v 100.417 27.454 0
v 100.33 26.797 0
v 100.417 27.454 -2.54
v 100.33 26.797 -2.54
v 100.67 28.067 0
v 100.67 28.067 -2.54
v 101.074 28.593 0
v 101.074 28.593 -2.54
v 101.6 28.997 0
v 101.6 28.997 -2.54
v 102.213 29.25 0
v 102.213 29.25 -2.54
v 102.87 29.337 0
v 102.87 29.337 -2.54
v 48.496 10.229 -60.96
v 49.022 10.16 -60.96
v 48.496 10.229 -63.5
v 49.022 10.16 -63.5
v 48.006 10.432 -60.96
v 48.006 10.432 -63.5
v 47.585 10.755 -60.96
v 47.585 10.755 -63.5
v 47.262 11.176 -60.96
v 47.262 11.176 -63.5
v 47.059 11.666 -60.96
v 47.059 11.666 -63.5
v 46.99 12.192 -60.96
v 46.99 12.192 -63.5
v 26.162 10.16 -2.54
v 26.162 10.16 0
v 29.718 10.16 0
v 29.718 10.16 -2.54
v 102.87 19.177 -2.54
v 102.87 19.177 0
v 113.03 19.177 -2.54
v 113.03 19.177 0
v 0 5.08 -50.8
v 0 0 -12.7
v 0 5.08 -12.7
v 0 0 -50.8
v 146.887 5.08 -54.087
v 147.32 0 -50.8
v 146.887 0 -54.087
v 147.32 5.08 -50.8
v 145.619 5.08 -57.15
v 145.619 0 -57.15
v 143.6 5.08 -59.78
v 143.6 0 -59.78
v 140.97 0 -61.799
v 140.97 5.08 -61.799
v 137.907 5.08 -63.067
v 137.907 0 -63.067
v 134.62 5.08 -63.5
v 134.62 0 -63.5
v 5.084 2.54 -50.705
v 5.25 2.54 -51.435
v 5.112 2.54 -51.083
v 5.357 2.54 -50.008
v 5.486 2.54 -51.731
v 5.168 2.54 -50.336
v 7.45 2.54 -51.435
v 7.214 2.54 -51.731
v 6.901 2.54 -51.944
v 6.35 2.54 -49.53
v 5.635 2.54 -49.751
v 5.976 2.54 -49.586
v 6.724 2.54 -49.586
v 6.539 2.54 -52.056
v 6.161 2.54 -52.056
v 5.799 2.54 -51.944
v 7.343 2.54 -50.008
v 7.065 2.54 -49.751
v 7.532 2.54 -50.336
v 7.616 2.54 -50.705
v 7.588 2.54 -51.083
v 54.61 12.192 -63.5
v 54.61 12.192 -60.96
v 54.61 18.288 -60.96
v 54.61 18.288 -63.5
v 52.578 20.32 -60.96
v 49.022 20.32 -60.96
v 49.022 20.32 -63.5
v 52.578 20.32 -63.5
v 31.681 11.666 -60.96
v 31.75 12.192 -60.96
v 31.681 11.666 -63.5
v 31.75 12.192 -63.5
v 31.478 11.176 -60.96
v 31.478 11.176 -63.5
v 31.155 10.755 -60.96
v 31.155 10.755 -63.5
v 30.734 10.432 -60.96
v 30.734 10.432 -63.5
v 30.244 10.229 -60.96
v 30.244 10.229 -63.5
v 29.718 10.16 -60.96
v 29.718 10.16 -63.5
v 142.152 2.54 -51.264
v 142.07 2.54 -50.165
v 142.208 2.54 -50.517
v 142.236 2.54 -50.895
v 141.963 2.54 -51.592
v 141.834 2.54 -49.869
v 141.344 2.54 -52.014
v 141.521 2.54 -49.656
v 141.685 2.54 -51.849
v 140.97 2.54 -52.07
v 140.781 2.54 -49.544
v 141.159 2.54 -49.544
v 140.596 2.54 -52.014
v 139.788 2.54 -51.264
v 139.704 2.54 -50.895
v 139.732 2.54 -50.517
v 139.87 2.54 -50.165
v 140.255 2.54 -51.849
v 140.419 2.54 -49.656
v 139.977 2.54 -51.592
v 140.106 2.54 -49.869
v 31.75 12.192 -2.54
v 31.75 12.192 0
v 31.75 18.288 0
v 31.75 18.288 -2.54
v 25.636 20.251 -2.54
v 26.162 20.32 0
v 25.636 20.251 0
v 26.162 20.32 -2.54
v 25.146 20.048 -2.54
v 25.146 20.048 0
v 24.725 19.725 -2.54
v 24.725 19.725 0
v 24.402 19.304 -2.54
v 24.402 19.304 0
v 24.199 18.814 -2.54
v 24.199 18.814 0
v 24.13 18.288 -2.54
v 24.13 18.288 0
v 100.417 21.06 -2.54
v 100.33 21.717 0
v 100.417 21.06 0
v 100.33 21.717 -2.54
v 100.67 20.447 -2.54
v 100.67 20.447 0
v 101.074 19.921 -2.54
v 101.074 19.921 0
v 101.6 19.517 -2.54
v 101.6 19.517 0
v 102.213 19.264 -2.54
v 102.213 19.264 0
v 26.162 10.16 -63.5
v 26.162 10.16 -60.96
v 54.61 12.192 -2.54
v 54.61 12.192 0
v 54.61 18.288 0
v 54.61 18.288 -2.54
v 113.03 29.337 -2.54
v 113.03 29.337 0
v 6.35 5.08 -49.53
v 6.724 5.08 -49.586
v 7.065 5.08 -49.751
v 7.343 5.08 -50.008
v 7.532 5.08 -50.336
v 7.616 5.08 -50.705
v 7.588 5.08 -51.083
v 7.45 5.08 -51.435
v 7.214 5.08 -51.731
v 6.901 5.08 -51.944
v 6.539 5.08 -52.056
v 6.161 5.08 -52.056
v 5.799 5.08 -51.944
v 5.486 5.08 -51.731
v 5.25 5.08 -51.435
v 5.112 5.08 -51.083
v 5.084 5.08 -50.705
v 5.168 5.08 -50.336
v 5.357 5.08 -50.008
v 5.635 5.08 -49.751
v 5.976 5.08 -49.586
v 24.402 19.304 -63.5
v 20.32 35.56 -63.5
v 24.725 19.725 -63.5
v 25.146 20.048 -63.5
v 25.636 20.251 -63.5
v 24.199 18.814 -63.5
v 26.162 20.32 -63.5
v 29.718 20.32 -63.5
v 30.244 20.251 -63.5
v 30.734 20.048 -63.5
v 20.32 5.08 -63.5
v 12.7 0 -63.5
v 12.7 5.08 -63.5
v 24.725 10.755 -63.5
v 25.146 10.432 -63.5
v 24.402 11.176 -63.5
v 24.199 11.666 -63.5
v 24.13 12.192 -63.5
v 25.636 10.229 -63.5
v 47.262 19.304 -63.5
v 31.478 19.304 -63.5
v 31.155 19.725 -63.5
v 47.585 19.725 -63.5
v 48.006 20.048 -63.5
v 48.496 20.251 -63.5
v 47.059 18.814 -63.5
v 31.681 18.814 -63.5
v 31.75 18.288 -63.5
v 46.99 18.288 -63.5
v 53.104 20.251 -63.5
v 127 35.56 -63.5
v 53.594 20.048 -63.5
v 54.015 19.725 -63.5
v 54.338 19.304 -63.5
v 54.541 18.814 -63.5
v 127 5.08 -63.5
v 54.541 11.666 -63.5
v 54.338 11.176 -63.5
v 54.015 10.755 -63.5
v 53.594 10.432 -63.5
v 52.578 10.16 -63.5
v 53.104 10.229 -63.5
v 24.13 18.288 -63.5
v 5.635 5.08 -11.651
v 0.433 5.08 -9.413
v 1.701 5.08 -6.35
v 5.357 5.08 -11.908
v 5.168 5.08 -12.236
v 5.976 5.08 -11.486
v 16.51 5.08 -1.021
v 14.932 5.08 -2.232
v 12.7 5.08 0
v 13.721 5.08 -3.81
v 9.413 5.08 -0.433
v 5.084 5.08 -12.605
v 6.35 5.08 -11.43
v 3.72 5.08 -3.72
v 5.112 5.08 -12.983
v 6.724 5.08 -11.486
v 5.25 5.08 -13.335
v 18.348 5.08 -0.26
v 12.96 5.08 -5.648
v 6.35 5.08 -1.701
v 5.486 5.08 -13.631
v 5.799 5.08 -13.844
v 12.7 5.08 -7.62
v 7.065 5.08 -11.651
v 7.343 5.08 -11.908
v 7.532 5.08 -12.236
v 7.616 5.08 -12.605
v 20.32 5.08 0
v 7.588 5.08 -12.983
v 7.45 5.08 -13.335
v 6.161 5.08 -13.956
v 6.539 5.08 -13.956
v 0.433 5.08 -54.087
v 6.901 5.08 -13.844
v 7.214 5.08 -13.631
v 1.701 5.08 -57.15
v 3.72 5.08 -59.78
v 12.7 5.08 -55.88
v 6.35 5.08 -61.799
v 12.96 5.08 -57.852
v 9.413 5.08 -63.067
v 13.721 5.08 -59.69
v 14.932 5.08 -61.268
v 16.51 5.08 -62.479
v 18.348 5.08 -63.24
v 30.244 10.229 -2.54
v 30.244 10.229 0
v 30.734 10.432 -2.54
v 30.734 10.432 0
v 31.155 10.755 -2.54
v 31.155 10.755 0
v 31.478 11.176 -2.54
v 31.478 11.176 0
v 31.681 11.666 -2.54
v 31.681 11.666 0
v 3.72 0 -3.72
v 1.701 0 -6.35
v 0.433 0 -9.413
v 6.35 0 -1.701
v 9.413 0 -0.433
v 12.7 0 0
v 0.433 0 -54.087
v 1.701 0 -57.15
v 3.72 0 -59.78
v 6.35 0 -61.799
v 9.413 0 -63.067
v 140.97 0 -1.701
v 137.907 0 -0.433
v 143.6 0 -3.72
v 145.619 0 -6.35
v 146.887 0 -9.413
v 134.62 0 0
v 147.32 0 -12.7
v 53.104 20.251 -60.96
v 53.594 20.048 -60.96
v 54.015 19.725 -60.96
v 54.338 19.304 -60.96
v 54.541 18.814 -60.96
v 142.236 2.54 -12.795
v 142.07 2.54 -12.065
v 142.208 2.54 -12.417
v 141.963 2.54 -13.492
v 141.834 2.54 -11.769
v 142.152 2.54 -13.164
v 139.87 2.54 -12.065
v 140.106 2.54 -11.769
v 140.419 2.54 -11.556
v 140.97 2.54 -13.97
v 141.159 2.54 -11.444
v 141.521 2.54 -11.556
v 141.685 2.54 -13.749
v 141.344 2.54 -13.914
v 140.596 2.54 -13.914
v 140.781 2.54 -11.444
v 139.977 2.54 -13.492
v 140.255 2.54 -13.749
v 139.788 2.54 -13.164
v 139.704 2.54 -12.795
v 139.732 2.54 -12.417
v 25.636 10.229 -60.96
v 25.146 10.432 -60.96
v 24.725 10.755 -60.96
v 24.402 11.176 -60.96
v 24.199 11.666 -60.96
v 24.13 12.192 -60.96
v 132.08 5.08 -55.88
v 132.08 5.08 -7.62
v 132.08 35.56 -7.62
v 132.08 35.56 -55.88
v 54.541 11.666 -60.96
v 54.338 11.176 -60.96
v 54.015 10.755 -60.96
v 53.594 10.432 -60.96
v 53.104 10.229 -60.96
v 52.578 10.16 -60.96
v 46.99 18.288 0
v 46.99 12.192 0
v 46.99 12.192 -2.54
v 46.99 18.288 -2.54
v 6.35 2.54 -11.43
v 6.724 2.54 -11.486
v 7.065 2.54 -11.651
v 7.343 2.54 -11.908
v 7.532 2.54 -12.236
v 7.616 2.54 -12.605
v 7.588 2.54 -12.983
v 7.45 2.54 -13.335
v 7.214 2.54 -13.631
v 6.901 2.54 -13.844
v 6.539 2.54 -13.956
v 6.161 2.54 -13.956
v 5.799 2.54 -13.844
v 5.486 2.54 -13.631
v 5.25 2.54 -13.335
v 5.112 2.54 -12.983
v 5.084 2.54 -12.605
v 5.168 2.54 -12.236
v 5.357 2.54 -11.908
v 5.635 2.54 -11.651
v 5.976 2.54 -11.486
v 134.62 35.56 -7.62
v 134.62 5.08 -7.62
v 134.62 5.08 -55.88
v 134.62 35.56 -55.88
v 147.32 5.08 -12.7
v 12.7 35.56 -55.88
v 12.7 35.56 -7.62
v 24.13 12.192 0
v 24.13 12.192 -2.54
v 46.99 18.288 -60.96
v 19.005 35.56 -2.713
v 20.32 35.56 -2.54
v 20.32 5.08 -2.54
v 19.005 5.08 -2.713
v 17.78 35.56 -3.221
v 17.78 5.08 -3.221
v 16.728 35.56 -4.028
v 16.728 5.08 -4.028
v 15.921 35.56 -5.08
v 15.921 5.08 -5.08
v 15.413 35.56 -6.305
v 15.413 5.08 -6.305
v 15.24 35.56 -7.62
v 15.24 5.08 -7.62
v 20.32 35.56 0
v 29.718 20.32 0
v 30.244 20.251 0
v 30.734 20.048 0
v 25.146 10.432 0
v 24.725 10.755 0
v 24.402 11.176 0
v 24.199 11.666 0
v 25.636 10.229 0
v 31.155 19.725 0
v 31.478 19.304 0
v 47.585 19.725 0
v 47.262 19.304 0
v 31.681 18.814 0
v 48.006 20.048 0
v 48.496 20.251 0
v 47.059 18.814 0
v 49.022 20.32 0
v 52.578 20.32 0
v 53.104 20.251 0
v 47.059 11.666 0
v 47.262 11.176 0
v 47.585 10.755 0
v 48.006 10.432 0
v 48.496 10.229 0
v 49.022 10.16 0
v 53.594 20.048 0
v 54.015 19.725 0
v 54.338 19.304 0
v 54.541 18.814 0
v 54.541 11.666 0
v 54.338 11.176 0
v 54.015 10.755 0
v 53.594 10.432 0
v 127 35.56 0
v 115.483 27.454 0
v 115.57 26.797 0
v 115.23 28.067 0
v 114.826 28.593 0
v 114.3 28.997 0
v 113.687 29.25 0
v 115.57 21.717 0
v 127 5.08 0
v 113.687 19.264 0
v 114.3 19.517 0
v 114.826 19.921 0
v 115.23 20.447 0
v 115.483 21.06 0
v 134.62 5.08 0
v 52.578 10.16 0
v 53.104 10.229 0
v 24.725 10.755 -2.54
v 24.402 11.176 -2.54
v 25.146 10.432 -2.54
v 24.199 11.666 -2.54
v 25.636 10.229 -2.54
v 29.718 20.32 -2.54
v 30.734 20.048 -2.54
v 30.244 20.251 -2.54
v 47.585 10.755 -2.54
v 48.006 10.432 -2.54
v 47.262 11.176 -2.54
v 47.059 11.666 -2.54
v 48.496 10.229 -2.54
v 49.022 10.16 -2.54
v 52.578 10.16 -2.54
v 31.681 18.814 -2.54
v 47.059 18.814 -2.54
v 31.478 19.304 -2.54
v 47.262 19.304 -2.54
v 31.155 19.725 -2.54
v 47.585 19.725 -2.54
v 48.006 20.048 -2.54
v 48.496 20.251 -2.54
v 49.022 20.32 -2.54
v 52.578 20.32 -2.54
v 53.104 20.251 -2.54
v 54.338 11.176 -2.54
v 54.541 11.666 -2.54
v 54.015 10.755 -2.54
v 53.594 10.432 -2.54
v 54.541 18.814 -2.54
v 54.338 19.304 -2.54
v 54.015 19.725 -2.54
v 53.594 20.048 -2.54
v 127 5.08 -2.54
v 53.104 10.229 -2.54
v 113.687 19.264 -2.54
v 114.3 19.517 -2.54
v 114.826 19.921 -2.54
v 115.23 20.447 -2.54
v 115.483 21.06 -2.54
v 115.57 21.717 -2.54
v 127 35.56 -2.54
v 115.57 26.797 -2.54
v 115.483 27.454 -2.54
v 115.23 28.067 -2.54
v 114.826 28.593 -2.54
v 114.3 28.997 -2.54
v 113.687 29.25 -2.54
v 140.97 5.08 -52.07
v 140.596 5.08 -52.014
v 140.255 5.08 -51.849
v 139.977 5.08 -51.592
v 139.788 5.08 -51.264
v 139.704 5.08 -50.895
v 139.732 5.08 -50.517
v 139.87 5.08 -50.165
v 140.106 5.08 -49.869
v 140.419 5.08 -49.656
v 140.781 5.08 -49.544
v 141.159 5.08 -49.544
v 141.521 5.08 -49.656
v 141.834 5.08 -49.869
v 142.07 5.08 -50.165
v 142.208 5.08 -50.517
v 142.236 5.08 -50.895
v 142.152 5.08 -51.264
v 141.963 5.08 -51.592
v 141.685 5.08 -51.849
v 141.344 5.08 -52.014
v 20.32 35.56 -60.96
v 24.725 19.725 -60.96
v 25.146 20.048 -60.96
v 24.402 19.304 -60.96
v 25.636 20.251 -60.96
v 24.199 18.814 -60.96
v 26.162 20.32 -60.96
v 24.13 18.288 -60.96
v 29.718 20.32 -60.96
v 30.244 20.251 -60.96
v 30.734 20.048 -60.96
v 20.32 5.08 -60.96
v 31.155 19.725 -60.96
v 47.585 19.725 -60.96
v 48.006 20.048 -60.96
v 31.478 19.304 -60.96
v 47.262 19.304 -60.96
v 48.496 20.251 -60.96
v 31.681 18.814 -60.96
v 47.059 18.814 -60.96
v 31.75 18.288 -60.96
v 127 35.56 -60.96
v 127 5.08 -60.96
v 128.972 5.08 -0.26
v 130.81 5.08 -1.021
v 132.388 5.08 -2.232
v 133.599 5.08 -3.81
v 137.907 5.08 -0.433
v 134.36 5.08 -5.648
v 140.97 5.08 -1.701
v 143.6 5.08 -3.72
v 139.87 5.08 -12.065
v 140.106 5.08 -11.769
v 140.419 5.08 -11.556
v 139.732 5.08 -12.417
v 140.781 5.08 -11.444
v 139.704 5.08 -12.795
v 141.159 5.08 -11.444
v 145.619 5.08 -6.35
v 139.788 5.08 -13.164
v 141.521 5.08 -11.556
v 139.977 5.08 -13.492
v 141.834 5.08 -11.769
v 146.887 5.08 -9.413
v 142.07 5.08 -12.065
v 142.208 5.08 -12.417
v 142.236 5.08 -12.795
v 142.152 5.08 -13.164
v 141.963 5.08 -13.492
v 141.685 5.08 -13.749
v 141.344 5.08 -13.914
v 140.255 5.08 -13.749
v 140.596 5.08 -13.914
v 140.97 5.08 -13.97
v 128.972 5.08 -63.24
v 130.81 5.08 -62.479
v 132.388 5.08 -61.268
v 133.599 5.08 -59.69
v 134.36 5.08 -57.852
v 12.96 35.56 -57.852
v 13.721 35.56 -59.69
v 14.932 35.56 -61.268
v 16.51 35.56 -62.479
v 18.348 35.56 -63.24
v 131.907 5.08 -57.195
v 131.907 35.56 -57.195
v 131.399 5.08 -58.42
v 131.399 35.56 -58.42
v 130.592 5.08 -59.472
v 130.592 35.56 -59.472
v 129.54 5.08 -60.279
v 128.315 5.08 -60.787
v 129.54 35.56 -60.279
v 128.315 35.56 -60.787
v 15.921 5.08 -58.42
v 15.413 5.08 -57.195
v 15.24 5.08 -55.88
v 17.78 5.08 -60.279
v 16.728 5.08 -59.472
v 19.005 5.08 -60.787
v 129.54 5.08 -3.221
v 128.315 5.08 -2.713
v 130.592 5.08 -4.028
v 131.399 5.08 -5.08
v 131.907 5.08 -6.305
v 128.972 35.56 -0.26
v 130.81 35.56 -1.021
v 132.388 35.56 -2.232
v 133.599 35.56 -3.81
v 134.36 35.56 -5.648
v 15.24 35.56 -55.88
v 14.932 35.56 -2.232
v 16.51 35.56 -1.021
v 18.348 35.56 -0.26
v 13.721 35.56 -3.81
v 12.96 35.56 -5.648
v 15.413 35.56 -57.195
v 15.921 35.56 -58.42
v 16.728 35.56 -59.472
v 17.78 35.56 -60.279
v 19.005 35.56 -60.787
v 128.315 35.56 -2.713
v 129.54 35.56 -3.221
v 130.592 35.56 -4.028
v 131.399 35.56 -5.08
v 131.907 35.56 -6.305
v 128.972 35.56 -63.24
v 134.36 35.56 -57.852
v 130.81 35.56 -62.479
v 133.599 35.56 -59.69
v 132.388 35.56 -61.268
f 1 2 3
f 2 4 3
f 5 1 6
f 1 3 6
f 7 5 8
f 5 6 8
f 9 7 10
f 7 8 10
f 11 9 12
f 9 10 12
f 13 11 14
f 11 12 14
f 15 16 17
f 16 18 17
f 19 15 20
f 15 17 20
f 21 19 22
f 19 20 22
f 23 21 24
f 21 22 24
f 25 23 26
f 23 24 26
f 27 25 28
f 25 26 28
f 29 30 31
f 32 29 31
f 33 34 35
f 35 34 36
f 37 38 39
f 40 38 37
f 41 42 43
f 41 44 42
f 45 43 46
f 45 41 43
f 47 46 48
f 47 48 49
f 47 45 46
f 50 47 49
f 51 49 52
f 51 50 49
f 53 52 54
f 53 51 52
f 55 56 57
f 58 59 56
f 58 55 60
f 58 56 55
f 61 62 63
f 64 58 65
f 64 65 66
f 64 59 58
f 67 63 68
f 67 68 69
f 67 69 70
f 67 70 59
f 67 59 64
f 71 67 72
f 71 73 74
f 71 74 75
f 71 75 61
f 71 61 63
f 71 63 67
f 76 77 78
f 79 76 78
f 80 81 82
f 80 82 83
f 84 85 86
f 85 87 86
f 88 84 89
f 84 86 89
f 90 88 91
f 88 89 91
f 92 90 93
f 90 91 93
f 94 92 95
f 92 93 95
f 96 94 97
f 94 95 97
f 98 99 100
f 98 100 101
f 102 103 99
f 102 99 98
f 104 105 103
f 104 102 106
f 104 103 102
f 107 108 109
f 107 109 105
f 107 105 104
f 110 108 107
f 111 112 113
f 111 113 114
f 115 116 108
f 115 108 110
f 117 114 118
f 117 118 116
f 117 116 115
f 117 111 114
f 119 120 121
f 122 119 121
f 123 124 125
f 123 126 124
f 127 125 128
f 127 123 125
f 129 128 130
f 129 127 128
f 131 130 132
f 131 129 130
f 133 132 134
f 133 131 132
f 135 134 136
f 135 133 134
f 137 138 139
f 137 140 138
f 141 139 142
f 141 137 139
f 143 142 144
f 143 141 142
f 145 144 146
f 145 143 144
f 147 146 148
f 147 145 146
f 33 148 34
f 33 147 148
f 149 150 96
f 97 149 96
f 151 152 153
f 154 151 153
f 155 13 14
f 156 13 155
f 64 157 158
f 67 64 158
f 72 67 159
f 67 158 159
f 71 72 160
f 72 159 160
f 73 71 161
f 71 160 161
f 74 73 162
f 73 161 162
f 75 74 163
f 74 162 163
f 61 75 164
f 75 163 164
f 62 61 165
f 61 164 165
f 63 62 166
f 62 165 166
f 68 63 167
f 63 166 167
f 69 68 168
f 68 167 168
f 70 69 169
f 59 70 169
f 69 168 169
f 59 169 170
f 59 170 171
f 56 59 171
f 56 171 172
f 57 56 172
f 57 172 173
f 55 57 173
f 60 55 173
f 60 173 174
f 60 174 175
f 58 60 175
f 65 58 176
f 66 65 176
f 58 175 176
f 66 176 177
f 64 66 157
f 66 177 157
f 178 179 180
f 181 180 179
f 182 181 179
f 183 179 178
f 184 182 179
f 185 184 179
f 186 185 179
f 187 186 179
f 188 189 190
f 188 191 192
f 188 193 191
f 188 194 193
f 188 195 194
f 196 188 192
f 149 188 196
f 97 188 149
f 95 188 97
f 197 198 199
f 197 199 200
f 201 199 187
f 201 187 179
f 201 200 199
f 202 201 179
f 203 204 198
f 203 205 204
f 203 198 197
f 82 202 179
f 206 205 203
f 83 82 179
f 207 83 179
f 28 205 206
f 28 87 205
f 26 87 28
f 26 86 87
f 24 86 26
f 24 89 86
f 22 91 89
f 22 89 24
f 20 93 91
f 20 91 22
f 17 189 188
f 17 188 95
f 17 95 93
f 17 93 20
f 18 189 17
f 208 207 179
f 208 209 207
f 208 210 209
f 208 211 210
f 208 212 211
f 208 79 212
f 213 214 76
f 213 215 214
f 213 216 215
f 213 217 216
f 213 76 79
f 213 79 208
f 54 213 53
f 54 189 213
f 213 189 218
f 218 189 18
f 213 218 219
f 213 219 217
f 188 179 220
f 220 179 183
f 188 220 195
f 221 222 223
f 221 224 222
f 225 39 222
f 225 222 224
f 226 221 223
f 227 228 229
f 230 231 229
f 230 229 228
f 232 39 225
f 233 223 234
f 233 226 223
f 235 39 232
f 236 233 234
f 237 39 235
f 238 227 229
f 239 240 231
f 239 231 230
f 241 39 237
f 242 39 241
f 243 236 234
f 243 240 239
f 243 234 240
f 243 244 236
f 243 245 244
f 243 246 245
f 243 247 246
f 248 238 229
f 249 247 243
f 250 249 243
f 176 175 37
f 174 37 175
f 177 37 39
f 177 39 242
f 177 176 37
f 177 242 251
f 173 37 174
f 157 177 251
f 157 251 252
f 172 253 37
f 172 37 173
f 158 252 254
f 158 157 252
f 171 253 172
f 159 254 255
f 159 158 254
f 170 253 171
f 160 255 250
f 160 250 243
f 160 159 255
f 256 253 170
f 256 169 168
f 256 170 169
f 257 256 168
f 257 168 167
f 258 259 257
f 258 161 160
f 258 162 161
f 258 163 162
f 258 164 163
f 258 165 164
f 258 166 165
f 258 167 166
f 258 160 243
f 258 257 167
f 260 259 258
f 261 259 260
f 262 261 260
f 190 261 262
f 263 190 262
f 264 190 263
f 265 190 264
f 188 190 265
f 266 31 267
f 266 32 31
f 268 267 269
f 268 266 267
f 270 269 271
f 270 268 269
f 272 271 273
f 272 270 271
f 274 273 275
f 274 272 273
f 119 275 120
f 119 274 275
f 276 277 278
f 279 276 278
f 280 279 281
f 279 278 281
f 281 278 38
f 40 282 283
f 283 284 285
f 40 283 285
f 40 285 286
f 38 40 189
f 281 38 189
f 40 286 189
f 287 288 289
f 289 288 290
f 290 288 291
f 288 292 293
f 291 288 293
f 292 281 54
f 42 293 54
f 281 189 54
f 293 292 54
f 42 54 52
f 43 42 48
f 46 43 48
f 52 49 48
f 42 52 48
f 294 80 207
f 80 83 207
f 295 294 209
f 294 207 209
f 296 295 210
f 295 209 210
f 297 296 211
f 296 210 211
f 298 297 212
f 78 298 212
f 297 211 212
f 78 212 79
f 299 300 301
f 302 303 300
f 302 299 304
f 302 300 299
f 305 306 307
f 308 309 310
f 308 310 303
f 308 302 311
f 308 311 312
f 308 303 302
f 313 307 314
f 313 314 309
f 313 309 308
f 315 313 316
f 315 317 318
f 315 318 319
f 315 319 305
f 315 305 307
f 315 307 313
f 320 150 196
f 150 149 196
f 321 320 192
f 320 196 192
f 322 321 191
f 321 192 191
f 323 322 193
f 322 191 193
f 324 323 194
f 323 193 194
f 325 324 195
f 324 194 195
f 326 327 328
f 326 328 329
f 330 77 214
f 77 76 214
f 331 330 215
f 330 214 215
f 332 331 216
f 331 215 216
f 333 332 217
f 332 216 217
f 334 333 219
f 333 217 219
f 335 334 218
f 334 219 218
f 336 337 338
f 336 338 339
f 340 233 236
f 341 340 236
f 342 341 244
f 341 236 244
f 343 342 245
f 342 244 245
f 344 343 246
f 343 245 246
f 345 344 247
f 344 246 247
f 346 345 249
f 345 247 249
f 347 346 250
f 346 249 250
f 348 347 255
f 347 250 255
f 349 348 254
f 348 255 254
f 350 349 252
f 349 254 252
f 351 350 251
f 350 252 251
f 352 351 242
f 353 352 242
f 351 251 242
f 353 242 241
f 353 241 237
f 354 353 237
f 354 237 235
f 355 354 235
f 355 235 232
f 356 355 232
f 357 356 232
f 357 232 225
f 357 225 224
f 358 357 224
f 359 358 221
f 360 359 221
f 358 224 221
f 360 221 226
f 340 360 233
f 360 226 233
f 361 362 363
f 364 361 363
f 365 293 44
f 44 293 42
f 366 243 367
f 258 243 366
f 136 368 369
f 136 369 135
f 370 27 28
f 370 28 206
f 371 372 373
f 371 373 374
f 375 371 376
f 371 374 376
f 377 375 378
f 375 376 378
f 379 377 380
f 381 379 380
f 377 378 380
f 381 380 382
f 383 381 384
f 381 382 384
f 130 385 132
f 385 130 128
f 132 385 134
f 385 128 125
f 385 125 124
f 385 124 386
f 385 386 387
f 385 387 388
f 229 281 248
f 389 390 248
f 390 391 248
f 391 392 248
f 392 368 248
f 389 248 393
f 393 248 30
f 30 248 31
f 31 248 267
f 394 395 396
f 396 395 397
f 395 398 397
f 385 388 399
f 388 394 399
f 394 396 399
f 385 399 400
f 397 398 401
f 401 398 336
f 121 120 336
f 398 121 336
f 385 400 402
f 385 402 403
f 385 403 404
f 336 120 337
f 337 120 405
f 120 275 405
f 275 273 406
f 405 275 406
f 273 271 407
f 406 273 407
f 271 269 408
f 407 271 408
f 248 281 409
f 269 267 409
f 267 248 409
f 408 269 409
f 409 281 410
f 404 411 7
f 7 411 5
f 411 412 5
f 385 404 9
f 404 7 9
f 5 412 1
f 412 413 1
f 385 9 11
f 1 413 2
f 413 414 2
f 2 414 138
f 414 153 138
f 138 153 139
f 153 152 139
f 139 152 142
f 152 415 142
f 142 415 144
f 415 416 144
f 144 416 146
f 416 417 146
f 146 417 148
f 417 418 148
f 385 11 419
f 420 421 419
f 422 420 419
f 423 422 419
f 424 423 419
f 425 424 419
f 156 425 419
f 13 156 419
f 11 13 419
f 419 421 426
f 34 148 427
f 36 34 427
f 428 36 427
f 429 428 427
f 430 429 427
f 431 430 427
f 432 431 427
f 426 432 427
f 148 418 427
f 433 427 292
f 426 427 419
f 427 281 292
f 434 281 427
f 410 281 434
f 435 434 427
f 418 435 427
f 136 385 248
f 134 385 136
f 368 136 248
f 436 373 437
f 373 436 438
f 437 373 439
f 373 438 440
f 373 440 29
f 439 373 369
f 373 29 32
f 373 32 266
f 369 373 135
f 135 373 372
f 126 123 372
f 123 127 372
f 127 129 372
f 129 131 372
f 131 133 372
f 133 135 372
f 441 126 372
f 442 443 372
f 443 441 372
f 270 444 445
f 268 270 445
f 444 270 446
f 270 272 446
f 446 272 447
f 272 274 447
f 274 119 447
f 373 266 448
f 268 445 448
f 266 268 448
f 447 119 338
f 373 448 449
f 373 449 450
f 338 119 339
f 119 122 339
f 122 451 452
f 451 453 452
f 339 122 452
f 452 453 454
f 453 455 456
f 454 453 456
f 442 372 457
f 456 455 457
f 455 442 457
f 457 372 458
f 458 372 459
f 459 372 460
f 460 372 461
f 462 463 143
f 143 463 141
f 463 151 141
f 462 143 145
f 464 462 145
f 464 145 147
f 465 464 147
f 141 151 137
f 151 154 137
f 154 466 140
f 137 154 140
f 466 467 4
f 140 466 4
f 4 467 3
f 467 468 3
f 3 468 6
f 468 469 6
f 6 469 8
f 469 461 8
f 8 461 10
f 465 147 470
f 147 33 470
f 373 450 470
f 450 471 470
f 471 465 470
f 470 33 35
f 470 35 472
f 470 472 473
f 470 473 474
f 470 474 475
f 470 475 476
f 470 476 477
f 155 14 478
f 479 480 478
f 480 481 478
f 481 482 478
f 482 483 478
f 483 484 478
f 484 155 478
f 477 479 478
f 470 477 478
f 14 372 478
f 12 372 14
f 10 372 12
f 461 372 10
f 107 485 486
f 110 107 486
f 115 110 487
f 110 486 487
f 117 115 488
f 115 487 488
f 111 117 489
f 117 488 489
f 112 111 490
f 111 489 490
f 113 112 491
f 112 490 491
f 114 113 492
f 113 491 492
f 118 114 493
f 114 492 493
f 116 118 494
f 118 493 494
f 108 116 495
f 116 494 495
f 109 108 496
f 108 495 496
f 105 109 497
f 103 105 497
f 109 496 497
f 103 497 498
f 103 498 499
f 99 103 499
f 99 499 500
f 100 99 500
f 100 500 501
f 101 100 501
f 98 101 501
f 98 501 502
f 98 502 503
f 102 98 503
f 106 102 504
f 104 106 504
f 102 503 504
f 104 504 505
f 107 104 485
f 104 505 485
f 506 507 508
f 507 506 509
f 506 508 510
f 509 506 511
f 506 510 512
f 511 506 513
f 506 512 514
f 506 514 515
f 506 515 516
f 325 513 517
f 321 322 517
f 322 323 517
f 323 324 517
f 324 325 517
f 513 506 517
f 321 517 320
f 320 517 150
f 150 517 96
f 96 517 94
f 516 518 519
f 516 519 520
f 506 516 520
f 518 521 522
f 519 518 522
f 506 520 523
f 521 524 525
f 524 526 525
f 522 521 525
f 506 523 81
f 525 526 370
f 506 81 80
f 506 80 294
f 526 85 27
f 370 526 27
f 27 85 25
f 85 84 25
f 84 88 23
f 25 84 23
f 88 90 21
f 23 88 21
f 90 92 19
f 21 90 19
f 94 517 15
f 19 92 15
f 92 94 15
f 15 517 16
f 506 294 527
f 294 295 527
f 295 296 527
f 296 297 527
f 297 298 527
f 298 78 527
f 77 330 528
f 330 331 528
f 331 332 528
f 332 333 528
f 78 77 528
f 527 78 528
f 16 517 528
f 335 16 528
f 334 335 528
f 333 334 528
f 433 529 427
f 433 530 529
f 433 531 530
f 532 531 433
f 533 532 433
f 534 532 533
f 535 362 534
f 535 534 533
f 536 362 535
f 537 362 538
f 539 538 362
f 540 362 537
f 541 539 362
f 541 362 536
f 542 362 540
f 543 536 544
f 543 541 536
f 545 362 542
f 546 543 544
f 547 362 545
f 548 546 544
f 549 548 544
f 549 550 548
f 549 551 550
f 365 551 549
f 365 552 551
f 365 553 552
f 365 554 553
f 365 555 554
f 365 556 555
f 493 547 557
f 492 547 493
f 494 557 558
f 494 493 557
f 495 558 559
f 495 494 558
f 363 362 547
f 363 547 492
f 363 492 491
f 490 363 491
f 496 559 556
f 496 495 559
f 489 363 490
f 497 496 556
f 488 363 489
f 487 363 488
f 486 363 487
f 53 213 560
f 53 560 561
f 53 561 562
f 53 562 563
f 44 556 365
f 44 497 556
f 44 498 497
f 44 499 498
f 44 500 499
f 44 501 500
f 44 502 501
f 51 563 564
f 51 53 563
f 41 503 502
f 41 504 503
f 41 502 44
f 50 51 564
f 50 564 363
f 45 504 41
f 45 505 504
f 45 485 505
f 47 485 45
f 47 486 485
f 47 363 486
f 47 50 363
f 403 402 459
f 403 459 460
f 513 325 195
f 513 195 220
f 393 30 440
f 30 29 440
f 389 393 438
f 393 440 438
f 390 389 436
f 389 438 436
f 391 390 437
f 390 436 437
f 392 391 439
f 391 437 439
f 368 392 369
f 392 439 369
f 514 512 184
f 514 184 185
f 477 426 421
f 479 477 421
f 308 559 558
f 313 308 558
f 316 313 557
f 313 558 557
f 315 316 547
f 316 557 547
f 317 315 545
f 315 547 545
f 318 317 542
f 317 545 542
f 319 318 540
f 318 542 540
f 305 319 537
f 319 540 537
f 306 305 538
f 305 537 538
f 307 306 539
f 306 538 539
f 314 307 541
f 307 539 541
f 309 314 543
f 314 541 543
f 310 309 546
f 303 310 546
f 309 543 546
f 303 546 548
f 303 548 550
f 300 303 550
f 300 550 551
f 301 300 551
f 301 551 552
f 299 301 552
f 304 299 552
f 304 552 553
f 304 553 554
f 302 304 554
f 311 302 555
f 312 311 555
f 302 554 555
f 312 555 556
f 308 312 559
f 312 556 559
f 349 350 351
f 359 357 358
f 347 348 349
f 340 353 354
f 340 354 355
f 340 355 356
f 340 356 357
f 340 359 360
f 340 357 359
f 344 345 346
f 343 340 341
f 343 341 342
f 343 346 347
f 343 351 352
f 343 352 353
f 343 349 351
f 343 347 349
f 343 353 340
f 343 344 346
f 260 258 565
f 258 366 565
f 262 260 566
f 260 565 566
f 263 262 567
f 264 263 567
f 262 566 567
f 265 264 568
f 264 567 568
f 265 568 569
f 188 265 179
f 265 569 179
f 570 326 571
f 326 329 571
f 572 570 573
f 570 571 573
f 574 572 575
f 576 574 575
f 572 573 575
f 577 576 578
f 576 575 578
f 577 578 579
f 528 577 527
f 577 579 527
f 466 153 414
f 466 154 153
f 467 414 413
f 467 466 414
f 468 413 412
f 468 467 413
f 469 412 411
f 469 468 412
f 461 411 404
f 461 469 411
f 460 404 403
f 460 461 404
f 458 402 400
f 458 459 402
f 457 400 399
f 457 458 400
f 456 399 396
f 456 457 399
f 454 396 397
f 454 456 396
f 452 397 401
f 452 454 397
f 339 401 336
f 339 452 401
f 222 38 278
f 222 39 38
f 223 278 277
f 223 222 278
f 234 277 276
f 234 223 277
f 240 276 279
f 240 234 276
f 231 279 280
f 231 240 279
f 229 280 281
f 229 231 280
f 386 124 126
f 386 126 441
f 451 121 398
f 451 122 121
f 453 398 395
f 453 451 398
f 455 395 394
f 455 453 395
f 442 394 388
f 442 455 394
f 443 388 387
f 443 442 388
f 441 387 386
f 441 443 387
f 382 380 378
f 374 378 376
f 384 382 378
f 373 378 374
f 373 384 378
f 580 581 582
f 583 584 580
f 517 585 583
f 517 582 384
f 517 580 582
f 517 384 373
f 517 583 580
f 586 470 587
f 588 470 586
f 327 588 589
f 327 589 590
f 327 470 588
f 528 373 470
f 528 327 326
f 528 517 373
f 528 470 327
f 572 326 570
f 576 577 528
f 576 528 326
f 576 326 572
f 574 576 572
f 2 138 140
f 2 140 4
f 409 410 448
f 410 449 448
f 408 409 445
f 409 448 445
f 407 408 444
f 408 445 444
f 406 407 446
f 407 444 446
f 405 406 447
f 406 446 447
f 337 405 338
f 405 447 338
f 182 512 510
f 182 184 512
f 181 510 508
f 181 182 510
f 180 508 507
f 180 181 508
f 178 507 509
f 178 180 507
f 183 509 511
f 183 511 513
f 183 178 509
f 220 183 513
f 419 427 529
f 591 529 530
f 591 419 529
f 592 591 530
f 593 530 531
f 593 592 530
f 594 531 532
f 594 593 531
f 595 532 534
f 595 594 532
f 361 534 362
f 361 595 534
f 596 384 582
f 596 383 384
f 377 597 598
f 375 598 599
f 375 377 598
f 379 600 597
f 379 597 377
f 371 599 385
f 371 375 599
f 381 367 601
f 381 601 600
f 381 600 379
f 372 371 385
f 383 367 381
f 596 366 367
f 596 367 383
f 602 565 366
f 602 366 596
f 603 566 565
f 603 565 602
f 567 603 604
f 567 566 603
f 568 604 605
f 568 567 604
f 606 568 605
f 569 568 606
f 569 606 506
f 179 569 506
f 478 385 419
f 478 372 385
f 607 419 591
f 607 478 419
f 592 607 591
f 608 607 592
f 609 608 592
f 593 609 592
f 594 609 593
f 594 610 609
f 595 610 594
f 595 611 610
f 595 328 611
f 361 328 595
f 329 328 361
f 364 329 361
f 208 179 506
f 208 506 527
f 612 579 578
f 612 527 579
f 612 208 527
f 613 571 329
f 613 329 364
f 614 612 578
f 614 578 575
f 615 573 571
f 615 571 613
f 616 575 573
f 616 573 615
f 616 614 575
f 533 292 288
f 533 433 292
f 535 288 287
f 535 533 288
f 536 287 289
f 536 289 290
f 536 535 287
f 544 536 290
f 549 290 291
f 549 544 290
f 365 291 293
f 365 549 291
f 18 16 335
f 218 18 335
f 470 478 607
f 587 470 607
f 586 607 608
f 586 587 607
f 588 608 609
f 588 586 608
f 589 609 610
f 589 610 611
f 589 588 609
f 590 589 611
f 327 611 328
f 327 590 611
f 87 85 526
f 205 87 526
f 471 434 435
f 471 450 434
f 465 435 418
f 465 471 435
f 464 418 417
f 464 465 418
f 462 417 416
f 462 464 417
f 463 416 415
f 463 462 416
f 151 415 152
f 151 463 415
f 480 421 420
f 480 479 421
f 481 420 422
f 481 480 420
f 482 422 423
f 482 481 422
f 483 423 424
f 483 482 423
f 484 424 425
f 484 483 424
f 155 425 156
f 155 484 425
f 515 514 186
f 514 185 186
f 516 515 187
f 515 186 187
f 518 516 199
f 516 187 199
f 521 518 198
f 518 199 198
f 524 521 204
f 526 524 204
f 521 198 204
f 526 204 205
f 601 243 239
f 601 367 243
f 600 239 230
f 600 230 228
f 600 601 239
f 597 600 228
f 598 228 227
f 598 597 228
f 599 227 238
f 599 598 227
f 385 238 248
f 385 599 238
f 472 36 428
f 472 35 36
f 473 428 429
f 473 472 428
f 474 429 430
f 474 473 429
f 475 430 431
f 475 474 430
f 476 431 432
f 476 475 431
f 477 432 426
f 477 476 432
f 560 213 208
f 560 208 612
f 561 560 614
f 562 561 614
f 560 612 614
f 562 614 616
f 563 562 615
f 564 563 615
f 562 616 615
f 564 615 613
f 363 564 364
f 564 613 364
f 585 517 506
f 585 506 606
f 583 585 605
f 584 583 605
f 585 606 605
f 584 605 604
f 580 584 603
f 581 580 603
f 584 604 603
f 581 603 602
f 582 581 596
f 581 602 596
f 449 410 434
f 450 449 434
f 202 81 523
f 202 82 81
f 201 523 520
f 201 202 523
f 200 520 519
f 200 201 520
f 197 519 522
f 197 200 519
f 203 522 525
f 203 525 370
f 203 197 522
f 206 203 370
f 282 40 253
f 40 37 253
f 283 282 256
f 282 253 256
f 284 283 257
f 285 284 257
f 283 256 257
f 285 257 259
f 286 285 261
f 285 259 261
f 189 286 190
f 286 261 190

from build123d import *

# Parameters (mm, degrees)
SKETCH1_W            = 147.32
SKETCH1_H            = 63.5
BOSS_EXTRUDE3_DEPTH  = 5.08
FILLET4_R            = 12.7
SKETCH4_W            = 121.92
SKETCH4_H            = 63.5
SKETCH4_W_2          = 116.84
SKETCH4_H_2          = 58.42
BOSS_EXTRUDE4_DEPTH  = 30.48
SKETCH9_W            = 10.16
SKETCH9_H            = 10.16
BOSS_EXTRUDE5_DEPTH  = 5.08
FILLET9_R            = 5.08
SKETCH10_R           = 3.175
CUT_EXTRUDE7_DEPTH   = 163.421034352
FILLET12_R           = 7.62
SKETCH11_R           = 3.175
SKETCH11_R_2         = 1.27
BOSS_EXTRUDE7_DEPTH  = 5.08
SKETCH15_R           = 1.27
CUT_EXTRUDE10_DEPTH  = 2.54
BOSS_EXTRUDE9_START  = -2.54
SKETCH16_R           = 3.175
BOSS_EXTRUDE9_DEPTH  = 2.54
SKETCH17_W           = 116.84
SKETCH17_H           = 58.42
CUT_EXTRUDE11_DEPTH  = 5.08
SKETCH18_W           = 116.84
SKETCH18_H           = 58.42
BOSS_EXTRUDE10_DEPTH = 5.08
FILLET16_R           = 5.08
SKETCH13_W           = 7.62
SKETCH13_H           = 10.16
CUT_EXTRUDE12_DEPTH  = 165.316602935
FILLET17_R           = 2.032
CUT_EXTRUDE14_REACH  = 166.317
SKETCH12_W           = 15.24
SKETCH12_H           = 10.16
FILLET18_R           = 2.54


with BuildPart() as part:
    # Sketch1 → Boss-Extrude3 (new body)
    with BuildSketch(Plane(origin=(0, 0, 0), x_dir=(1, 0, 0), z_dir=(0, 1, 0))):
        with Locations((73.66, 31.75)):
            Rectangle(SKETCH1_W, SKETCH1_H)
    extrude(amount=BOSS_EXTRUDE3_DEPTH)

    # Fillet4
    fillet4_edges = [part.edges().sort_by_distance(p)[0] for p in [
        (0, 2.54, -63.5),
        (147.32, 2.54, -63.5),
        (147.32, 2.54, 0),
        (0, 2.54, 0),
    ]]
    fillet(fillet4_edges, radius=FILLET4_R)

    # Sketch4 → Boss-Extrude4 (add)
    with BuildSketch(Plane(origin=(0, 5.08, 0), x_dir=(1, 0, 0), z_dir=(0, 1, 0))):
        with Locations((73.66, 31.75)):
            Rectangle(SKETCH4_W, SKETCH4_H)
        with Locations((73.66, 31.75)):
            Rectangle(SKETCH4_W_2, SKETCH4_H_2, mode=Mode.SUBTRACT)
    extrude(amount=BOSS_EXTRUDE4_DEPTH)

    # Sketch9 → Boss-Extrude5 (add)
    with BuildSketch(Plane(origin=(0, 5.08, 0), x_dir=(1, 0, 0), z_dir=(0, 1, 0))):
        with Locations((20.32, 55.88)):
            Rectangle(SKETCH9_W, SKETCH9_H)
        with Locations((127, 55.88)):
            Rectangle(SKETCH9_W, SKETCH9_H)
        with Locations((127, 7.62)):
            Rectangle(SKETCH9_W, SKETCH9_H)
        with Locations((20.32, 7.62)):
            Rectangle(SKETCH9_W, SKETCH9_H)
    extrude(amount=BOSS_EXTRUDE5_DEPTH)

    # Fillet9
    fillet9_edges = [part.edges().sort_by_distance(p)[0] for p in [
        (25.4, 7.62, -12.7),
        (25.4, 7.62, -50.8),
        (121.92, 7.62, -50.8),
        (121.92, 7.62, -12.7),
    ]]
    fillet(fillet9_edges, radius=FILLET9_R)

    # Sketch10 → Cut-Extrude7 (cut, through all)
    with BuildSketch(Plane(origin=(0, 10.16, 0), x_dir=(1, 0, 0), z_dir=(0, 1, 0))):
        with Locations(Location((20.32, 55.88, 0), (0, 0, 270))):
            Circle(SKETCH10_R)
        with Locations(Location((127, 55.88, 0), (0, 0, 270))):
            Circle(SKETCH10_R)
        with Locations(Location((20.32, 7.62, 0), (0, 0, 270))):
            Circle(SKETCH10_R)
        with Locations(Location((127, 7.62, 0), (0, 0, 270))):
            Circle(SKETCH10_R)
    extrude(amount=-CUT_EXTRUDE7_DEPTH, mode=Mode.SUBTRACT)

    # Fillet12
    fillet12_edges = [part.edges().sort_by_distance(p)[0] for p in [
        (12.7, 20.32, -63.5),
        (12.7, 20.32, 0),
        (134.62, 20.32, 0),
        (134.62, 20.32, -63.5),
    ]]
    fillet(fillet12_edges, radius=FILLET12_R)

    # Sketch11 → Boss-Extrude7 (add)
    # profile 1 of 4: a face of its own
    with BuildSketch(Plane(origin=(0, 10.16, 0), x_dir=(1, 0, 0), z_dir=(0, 1, 0))):
        with Locations(Location((20.32, 55.88, 0), (0, 0, 270))):
            Circle(SKETCH11_R)
        with Locations(Location((20.32, 55.88, 0), (0, 0, 270))):
            Circle(SKETCH11_R_2, mode=Mode.SUBTRACT)
    # profile 2 of 4: a face of its own
    with BuildSketch(Plane(origin=(0, 10.16, 0), x_dir=(1, 0, 0), z_dir=(0, 1, 0))):
        with Locations(Location((127, 55.88, 0), (0, 0, 270))):
            Circle(SKETCH11_R)
        with Locations(Location((127, 55.88, 0), (0, 0, 270))):
            Circle(SKETCH11_R_2, mode=Mode.SUBTRACT)
    # profile 3 of 4: a face of its own
    with BuildSketch(Plane(origin=(0, 10.16, 0), x_dir=(1, 0, 0), z_dir=(0, 1, 0))):
        with Locations(Location((20.32, 7.62, 0), (0, 0, 270))):
            Circle(SKETCH11_R)
        with Locations(Location((20.32, 7.62, 0), (0, 0, 270))):
            Circle(SKETCH11_R_2, mode=Mode.SUBTRACT)
    # profile 4 of 4: a face of its own
    with BuildSketch(Plane(origin=(0, 10.16, 0), x_dir=(1, 0, 0), z_dir=(0, 1, 0))):
        with Locations(Location((127, 7.62, 0), (0, 0, 270))):
            Circle(SKETCH11_R)
        with Locations(Location((127, 7.62, 0), (0, 0, 270))):
            Circle(SKETCH11_R_2, mode=Mode.SUBTRACT)
    extrude(amount=-BOSS_EXTRUDE7_DEPTH)

    # Sketch15 → Cut-Extrude10 (cut)
    with BuildSketch(Plane(origin=(0, 5.08, 0), x_dir=(1, 0, 0), z_dir=(0, 1, 0))):
        with Locations(Location((6.35, 50.8, 0), (0, 0, 270))):
            Circle(SKETCH15_R)
        with Locations(Location((6.35, 12.7, 0), (0, 0, 270))):
            Circle(SKETCH15_R)
        with Locations(Location((140.97, 12.7, 0), (0, 0, 90))):
            Circle(SKETCH15_R)
        with Locations(Location((140.97, 50.8, 0), (0, 0, 90))):
            Circle(SKETCH15_R)
    extrude(amount=-CUT_EXTRUDE10_DEPTH, mode=Mode.SUBTRACT)

    # Sketch16 → Boss-Extrude9 (add)
    with BuildSketch(Plane.XZ.offset(BOSS_EXTRUDE9_START)):
        with Locations(Location((20.32, -7.62, 0), (0, 0, 90))):
            Circle(SKETCH16_R)
        with Locations(Location((127, -7.62, 0), (0, 0, 90))):
            Circle(SKETCH16_R)
        with Locations(Location((20.32, -55.88, 0), (0, 0, 90))):
            Circle(SKETCH16_R)
        with Locations(Location((127, -55.88, 0), (0, 0, 90))):
            Circle(SKETCH16_R)
    extrude(amount=BOSS_EXTRUDE9_DEPTH)

    # Sketch17 → Cut-Extrude11 (cut)
    with BuildSketch(Plane(origin=(0, 10.16, 0), x_dir=(1, 0, 0), z_dir=(0, 1, 0))):
        with Locations((73.66, 31.75)):
            Rectangle(SKETCH17_W, SKETCH17_H)
    extrude(amount=-CUT_EXTRUDE11_DEPTH, mode=Mode.SUBTRACT)

    # Sketch18 → Boss-Extrude10 (add)
    with BuildSketch(Plane(origin=(0, 5.08, 0), x_dir=(1, 0, 0), z_dir=(0, 1, 0))):
        with Locations((73.66, 31.75)):
            Rectangle(SKETCH18_W, SKETCH18_H)
    extrude(amount=-BOSS_EXTRUDE10_DEPTH)

    # Fillet16
    fillet16_edges = [part.edges().sort_by_distance(p)[0] for p in [
        (15.24, 20.32, -2.54),
        (132.08, 20.32, -2.54),
        (132.08, 20.32, -60.96),
        (15.24, 20.32, -60.96),
    ]]
    fillet(fillet16_edges, radius=FILLET16_R)

    # Sketch13 → Cut-Extrude12 (cut, through all)
    with BuildSketch(Plane.XY):
        with Locations((27.94, 15.24)):
            Rectangle(SKETCH13_W, SKETCH13_H)
        with Locations((50.8, 15.24)):
            Rectangle(SKETCH13_W, SKETCH13_H)
    extrude(amount=-CUT_EXTRUDE12_DEPTH, mode=Mode.SUBTRACT)

    # Fillet17
    fillet17_edges = [part.edges().sort_by_distance(p)[0] for p in [
        (24.13, 10.16, -1.27),
        (24.13, 20.32, -1.27),
        (31.75, 20.32, -1.27),
        (31.75, 10.16, -1.27),
        (24.13, 10.16, -62.23),
        (24.13, 20.32, -62.23),
        (31.75, 20.32, -62.23),
        (31.75, 10.16, -62.23),
        (46.99, 10.16, -1.27),
        (46.99, 20.32, -1.27),
        (54.61, 20.32, -1.27),
        (54.61, 10.16, -1.27),
        (46.99, 10.16, -62.23),
        (46.99, 20.32, -62.23),
        (54.61, 20.32, -62.23),
        (54.61, 10.16, -62.23),
    ]]
    fillet(fillet17_edges, radius=FILLET17_R)

    # Sketch12 → Cut-Extrude14 (cut, up to next)
    with BuildSketch(Plane.XY, mode=Mode.PRIVATE) as cut_extrude14_sk1:
        with Locations((107.95, 24.257)):
            Rectangle(SKETCH12_W, SKETCH12_H)
    cut_extrude14_tool1 = extrude(cut_extrude14_sk1.sketch, amount=-CUT_EXTRUDE14_REACH, mode=Mode.PRIVATE) & part.part
    add(cut_extrude14_tool1.solids().sort_by_distance((107.95, 24.257, 0))[0], mode=Mode.SUBTRACT)

    # Fillet18
    fillet18_edges = [part.edges().sort_by_distance(p)[0] for p in [
        (100.33, 19.177, -1.27),
        (100.33, 29.337, -1.27),
        (115.57, 29.337, -1.27),
        (115.57, 19.177, -1.27),
    ]]
    fillet(fillet18_edges, radius=FILLET18_R)


solid = part.part
